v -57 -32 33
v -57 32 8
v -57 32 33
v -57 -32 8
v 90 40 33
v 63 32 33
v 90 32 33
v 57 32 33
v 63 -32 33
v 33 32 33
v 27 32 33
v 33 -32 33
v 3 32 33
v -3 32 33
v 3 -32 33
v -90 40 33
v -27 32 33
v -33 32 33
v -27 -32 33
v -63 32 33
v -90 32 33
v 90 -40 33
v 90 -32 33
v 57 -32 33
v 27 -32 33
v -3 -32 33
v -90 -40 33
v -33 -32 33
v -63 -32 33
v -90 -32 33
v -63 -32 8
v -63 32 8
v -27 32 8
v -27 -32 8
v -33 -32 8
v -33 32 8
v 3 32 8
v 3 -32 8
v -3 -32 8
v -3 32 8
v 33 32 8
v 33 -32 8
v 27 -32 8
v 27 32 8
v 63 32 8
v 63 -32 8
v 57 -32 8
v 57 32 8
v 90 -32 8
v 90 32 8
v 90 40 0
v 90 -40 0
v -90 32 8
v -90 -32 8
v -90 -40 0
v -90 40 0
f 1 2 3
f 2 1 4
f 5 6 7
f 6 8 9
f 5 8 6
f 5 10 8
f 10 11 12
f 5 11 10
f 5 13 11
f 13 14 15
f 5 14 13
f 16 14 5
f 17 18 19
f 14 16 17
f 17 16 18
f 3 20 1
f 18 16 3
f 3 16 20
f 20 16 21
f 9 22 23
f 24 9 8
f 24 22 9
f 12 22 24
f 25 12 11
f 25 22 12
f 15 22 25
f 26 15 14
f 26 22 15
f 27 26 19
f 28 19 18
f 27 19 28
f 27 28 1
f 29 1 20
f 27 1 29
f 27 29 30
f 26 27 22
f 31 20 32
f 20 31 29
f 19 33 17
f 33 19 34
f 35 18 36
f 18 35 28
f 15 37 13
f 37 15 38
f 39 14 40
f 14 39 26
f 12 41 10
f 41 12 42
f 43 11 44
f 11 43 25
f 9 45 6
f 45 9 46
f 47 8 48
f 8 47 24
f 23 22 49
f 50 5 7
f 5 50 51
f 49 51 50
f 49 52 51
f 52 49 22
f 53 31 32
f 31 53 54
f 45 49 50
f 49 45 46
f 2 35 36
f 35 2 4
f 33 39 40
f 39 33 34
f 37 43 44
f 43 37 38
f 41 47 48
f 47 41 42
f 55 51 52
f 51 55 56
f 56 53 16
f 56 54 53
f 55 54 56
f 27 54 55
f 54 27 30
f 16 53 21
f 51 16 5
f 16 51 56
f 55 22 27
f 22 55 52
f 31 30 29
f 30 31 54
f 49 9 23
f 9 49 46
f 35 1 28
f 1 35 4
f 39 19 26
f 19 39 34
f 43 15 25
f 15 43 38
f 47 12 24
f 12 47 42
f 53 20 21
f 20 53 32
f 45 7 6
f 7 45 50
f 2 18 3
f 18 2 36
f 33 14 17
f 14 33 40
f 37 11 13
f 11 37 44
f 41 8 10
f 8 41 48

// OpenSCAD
$fn = 32;

// ----------------------------------------------------------------------
// Rib frame 180 x 80 x 33
// 5 ribs at 30 mm pitch
// ----------------------------------------------------------------------

// --- parameters (mm) ---
frame = [180, 80, 8];  // base plate size (x, y, z)
rail_w = 8;            // side rail width
ribs = 5;              // number of ribs
rib_t = 6;             // rib thickness
rib_h = 25;            // rib height above the base plate
pitch = 30;            // pitch between rib centres

// --- derived feature positions (mm) ---
span = (ribs - 1) * pitch;          // = 120   distance between the outer ribs
origin_x = -span / 2;               // = -60   X of the first rib
rib_len = frame[1] - 2 * rail_w + 2;  // = 66   rib length, 1 mm into each rail
feature_centers = [
  [origin_x + 0 * pitch, 0],
  [origin_x + 1 * pitch, 0],
  [origin_x + 2 * pitch, 0],
  [origin_x + 3 * pitch, 0],
  [origin_x + 4 * pitch, 0]
];   // rib centre line, drives the rib loop

// base plate, two side rails, then the ribs read straight off feature_centers
union() {
  translate([-frame[0] / 2, -frame[1] / 2, 0]) cube(frame);
  translate([-frame[0] / 2, -frame[1] / 2, 0]) cube([frame[0], rail_w, frame[2] + rib_h]);
  translate([-frame[0] / 2, frame[1] / 2 - rail_w, 0]) cube([frame[0], rail_w, frame[2] + rib_h]);
  for (centre = feature_centers)
    translate([centre[0] - rib_t / 2, centre[1] - rib_len / 2, frame[2] - 1])
      cube([rib_t, rib_len, rib_h + 1]);
}
